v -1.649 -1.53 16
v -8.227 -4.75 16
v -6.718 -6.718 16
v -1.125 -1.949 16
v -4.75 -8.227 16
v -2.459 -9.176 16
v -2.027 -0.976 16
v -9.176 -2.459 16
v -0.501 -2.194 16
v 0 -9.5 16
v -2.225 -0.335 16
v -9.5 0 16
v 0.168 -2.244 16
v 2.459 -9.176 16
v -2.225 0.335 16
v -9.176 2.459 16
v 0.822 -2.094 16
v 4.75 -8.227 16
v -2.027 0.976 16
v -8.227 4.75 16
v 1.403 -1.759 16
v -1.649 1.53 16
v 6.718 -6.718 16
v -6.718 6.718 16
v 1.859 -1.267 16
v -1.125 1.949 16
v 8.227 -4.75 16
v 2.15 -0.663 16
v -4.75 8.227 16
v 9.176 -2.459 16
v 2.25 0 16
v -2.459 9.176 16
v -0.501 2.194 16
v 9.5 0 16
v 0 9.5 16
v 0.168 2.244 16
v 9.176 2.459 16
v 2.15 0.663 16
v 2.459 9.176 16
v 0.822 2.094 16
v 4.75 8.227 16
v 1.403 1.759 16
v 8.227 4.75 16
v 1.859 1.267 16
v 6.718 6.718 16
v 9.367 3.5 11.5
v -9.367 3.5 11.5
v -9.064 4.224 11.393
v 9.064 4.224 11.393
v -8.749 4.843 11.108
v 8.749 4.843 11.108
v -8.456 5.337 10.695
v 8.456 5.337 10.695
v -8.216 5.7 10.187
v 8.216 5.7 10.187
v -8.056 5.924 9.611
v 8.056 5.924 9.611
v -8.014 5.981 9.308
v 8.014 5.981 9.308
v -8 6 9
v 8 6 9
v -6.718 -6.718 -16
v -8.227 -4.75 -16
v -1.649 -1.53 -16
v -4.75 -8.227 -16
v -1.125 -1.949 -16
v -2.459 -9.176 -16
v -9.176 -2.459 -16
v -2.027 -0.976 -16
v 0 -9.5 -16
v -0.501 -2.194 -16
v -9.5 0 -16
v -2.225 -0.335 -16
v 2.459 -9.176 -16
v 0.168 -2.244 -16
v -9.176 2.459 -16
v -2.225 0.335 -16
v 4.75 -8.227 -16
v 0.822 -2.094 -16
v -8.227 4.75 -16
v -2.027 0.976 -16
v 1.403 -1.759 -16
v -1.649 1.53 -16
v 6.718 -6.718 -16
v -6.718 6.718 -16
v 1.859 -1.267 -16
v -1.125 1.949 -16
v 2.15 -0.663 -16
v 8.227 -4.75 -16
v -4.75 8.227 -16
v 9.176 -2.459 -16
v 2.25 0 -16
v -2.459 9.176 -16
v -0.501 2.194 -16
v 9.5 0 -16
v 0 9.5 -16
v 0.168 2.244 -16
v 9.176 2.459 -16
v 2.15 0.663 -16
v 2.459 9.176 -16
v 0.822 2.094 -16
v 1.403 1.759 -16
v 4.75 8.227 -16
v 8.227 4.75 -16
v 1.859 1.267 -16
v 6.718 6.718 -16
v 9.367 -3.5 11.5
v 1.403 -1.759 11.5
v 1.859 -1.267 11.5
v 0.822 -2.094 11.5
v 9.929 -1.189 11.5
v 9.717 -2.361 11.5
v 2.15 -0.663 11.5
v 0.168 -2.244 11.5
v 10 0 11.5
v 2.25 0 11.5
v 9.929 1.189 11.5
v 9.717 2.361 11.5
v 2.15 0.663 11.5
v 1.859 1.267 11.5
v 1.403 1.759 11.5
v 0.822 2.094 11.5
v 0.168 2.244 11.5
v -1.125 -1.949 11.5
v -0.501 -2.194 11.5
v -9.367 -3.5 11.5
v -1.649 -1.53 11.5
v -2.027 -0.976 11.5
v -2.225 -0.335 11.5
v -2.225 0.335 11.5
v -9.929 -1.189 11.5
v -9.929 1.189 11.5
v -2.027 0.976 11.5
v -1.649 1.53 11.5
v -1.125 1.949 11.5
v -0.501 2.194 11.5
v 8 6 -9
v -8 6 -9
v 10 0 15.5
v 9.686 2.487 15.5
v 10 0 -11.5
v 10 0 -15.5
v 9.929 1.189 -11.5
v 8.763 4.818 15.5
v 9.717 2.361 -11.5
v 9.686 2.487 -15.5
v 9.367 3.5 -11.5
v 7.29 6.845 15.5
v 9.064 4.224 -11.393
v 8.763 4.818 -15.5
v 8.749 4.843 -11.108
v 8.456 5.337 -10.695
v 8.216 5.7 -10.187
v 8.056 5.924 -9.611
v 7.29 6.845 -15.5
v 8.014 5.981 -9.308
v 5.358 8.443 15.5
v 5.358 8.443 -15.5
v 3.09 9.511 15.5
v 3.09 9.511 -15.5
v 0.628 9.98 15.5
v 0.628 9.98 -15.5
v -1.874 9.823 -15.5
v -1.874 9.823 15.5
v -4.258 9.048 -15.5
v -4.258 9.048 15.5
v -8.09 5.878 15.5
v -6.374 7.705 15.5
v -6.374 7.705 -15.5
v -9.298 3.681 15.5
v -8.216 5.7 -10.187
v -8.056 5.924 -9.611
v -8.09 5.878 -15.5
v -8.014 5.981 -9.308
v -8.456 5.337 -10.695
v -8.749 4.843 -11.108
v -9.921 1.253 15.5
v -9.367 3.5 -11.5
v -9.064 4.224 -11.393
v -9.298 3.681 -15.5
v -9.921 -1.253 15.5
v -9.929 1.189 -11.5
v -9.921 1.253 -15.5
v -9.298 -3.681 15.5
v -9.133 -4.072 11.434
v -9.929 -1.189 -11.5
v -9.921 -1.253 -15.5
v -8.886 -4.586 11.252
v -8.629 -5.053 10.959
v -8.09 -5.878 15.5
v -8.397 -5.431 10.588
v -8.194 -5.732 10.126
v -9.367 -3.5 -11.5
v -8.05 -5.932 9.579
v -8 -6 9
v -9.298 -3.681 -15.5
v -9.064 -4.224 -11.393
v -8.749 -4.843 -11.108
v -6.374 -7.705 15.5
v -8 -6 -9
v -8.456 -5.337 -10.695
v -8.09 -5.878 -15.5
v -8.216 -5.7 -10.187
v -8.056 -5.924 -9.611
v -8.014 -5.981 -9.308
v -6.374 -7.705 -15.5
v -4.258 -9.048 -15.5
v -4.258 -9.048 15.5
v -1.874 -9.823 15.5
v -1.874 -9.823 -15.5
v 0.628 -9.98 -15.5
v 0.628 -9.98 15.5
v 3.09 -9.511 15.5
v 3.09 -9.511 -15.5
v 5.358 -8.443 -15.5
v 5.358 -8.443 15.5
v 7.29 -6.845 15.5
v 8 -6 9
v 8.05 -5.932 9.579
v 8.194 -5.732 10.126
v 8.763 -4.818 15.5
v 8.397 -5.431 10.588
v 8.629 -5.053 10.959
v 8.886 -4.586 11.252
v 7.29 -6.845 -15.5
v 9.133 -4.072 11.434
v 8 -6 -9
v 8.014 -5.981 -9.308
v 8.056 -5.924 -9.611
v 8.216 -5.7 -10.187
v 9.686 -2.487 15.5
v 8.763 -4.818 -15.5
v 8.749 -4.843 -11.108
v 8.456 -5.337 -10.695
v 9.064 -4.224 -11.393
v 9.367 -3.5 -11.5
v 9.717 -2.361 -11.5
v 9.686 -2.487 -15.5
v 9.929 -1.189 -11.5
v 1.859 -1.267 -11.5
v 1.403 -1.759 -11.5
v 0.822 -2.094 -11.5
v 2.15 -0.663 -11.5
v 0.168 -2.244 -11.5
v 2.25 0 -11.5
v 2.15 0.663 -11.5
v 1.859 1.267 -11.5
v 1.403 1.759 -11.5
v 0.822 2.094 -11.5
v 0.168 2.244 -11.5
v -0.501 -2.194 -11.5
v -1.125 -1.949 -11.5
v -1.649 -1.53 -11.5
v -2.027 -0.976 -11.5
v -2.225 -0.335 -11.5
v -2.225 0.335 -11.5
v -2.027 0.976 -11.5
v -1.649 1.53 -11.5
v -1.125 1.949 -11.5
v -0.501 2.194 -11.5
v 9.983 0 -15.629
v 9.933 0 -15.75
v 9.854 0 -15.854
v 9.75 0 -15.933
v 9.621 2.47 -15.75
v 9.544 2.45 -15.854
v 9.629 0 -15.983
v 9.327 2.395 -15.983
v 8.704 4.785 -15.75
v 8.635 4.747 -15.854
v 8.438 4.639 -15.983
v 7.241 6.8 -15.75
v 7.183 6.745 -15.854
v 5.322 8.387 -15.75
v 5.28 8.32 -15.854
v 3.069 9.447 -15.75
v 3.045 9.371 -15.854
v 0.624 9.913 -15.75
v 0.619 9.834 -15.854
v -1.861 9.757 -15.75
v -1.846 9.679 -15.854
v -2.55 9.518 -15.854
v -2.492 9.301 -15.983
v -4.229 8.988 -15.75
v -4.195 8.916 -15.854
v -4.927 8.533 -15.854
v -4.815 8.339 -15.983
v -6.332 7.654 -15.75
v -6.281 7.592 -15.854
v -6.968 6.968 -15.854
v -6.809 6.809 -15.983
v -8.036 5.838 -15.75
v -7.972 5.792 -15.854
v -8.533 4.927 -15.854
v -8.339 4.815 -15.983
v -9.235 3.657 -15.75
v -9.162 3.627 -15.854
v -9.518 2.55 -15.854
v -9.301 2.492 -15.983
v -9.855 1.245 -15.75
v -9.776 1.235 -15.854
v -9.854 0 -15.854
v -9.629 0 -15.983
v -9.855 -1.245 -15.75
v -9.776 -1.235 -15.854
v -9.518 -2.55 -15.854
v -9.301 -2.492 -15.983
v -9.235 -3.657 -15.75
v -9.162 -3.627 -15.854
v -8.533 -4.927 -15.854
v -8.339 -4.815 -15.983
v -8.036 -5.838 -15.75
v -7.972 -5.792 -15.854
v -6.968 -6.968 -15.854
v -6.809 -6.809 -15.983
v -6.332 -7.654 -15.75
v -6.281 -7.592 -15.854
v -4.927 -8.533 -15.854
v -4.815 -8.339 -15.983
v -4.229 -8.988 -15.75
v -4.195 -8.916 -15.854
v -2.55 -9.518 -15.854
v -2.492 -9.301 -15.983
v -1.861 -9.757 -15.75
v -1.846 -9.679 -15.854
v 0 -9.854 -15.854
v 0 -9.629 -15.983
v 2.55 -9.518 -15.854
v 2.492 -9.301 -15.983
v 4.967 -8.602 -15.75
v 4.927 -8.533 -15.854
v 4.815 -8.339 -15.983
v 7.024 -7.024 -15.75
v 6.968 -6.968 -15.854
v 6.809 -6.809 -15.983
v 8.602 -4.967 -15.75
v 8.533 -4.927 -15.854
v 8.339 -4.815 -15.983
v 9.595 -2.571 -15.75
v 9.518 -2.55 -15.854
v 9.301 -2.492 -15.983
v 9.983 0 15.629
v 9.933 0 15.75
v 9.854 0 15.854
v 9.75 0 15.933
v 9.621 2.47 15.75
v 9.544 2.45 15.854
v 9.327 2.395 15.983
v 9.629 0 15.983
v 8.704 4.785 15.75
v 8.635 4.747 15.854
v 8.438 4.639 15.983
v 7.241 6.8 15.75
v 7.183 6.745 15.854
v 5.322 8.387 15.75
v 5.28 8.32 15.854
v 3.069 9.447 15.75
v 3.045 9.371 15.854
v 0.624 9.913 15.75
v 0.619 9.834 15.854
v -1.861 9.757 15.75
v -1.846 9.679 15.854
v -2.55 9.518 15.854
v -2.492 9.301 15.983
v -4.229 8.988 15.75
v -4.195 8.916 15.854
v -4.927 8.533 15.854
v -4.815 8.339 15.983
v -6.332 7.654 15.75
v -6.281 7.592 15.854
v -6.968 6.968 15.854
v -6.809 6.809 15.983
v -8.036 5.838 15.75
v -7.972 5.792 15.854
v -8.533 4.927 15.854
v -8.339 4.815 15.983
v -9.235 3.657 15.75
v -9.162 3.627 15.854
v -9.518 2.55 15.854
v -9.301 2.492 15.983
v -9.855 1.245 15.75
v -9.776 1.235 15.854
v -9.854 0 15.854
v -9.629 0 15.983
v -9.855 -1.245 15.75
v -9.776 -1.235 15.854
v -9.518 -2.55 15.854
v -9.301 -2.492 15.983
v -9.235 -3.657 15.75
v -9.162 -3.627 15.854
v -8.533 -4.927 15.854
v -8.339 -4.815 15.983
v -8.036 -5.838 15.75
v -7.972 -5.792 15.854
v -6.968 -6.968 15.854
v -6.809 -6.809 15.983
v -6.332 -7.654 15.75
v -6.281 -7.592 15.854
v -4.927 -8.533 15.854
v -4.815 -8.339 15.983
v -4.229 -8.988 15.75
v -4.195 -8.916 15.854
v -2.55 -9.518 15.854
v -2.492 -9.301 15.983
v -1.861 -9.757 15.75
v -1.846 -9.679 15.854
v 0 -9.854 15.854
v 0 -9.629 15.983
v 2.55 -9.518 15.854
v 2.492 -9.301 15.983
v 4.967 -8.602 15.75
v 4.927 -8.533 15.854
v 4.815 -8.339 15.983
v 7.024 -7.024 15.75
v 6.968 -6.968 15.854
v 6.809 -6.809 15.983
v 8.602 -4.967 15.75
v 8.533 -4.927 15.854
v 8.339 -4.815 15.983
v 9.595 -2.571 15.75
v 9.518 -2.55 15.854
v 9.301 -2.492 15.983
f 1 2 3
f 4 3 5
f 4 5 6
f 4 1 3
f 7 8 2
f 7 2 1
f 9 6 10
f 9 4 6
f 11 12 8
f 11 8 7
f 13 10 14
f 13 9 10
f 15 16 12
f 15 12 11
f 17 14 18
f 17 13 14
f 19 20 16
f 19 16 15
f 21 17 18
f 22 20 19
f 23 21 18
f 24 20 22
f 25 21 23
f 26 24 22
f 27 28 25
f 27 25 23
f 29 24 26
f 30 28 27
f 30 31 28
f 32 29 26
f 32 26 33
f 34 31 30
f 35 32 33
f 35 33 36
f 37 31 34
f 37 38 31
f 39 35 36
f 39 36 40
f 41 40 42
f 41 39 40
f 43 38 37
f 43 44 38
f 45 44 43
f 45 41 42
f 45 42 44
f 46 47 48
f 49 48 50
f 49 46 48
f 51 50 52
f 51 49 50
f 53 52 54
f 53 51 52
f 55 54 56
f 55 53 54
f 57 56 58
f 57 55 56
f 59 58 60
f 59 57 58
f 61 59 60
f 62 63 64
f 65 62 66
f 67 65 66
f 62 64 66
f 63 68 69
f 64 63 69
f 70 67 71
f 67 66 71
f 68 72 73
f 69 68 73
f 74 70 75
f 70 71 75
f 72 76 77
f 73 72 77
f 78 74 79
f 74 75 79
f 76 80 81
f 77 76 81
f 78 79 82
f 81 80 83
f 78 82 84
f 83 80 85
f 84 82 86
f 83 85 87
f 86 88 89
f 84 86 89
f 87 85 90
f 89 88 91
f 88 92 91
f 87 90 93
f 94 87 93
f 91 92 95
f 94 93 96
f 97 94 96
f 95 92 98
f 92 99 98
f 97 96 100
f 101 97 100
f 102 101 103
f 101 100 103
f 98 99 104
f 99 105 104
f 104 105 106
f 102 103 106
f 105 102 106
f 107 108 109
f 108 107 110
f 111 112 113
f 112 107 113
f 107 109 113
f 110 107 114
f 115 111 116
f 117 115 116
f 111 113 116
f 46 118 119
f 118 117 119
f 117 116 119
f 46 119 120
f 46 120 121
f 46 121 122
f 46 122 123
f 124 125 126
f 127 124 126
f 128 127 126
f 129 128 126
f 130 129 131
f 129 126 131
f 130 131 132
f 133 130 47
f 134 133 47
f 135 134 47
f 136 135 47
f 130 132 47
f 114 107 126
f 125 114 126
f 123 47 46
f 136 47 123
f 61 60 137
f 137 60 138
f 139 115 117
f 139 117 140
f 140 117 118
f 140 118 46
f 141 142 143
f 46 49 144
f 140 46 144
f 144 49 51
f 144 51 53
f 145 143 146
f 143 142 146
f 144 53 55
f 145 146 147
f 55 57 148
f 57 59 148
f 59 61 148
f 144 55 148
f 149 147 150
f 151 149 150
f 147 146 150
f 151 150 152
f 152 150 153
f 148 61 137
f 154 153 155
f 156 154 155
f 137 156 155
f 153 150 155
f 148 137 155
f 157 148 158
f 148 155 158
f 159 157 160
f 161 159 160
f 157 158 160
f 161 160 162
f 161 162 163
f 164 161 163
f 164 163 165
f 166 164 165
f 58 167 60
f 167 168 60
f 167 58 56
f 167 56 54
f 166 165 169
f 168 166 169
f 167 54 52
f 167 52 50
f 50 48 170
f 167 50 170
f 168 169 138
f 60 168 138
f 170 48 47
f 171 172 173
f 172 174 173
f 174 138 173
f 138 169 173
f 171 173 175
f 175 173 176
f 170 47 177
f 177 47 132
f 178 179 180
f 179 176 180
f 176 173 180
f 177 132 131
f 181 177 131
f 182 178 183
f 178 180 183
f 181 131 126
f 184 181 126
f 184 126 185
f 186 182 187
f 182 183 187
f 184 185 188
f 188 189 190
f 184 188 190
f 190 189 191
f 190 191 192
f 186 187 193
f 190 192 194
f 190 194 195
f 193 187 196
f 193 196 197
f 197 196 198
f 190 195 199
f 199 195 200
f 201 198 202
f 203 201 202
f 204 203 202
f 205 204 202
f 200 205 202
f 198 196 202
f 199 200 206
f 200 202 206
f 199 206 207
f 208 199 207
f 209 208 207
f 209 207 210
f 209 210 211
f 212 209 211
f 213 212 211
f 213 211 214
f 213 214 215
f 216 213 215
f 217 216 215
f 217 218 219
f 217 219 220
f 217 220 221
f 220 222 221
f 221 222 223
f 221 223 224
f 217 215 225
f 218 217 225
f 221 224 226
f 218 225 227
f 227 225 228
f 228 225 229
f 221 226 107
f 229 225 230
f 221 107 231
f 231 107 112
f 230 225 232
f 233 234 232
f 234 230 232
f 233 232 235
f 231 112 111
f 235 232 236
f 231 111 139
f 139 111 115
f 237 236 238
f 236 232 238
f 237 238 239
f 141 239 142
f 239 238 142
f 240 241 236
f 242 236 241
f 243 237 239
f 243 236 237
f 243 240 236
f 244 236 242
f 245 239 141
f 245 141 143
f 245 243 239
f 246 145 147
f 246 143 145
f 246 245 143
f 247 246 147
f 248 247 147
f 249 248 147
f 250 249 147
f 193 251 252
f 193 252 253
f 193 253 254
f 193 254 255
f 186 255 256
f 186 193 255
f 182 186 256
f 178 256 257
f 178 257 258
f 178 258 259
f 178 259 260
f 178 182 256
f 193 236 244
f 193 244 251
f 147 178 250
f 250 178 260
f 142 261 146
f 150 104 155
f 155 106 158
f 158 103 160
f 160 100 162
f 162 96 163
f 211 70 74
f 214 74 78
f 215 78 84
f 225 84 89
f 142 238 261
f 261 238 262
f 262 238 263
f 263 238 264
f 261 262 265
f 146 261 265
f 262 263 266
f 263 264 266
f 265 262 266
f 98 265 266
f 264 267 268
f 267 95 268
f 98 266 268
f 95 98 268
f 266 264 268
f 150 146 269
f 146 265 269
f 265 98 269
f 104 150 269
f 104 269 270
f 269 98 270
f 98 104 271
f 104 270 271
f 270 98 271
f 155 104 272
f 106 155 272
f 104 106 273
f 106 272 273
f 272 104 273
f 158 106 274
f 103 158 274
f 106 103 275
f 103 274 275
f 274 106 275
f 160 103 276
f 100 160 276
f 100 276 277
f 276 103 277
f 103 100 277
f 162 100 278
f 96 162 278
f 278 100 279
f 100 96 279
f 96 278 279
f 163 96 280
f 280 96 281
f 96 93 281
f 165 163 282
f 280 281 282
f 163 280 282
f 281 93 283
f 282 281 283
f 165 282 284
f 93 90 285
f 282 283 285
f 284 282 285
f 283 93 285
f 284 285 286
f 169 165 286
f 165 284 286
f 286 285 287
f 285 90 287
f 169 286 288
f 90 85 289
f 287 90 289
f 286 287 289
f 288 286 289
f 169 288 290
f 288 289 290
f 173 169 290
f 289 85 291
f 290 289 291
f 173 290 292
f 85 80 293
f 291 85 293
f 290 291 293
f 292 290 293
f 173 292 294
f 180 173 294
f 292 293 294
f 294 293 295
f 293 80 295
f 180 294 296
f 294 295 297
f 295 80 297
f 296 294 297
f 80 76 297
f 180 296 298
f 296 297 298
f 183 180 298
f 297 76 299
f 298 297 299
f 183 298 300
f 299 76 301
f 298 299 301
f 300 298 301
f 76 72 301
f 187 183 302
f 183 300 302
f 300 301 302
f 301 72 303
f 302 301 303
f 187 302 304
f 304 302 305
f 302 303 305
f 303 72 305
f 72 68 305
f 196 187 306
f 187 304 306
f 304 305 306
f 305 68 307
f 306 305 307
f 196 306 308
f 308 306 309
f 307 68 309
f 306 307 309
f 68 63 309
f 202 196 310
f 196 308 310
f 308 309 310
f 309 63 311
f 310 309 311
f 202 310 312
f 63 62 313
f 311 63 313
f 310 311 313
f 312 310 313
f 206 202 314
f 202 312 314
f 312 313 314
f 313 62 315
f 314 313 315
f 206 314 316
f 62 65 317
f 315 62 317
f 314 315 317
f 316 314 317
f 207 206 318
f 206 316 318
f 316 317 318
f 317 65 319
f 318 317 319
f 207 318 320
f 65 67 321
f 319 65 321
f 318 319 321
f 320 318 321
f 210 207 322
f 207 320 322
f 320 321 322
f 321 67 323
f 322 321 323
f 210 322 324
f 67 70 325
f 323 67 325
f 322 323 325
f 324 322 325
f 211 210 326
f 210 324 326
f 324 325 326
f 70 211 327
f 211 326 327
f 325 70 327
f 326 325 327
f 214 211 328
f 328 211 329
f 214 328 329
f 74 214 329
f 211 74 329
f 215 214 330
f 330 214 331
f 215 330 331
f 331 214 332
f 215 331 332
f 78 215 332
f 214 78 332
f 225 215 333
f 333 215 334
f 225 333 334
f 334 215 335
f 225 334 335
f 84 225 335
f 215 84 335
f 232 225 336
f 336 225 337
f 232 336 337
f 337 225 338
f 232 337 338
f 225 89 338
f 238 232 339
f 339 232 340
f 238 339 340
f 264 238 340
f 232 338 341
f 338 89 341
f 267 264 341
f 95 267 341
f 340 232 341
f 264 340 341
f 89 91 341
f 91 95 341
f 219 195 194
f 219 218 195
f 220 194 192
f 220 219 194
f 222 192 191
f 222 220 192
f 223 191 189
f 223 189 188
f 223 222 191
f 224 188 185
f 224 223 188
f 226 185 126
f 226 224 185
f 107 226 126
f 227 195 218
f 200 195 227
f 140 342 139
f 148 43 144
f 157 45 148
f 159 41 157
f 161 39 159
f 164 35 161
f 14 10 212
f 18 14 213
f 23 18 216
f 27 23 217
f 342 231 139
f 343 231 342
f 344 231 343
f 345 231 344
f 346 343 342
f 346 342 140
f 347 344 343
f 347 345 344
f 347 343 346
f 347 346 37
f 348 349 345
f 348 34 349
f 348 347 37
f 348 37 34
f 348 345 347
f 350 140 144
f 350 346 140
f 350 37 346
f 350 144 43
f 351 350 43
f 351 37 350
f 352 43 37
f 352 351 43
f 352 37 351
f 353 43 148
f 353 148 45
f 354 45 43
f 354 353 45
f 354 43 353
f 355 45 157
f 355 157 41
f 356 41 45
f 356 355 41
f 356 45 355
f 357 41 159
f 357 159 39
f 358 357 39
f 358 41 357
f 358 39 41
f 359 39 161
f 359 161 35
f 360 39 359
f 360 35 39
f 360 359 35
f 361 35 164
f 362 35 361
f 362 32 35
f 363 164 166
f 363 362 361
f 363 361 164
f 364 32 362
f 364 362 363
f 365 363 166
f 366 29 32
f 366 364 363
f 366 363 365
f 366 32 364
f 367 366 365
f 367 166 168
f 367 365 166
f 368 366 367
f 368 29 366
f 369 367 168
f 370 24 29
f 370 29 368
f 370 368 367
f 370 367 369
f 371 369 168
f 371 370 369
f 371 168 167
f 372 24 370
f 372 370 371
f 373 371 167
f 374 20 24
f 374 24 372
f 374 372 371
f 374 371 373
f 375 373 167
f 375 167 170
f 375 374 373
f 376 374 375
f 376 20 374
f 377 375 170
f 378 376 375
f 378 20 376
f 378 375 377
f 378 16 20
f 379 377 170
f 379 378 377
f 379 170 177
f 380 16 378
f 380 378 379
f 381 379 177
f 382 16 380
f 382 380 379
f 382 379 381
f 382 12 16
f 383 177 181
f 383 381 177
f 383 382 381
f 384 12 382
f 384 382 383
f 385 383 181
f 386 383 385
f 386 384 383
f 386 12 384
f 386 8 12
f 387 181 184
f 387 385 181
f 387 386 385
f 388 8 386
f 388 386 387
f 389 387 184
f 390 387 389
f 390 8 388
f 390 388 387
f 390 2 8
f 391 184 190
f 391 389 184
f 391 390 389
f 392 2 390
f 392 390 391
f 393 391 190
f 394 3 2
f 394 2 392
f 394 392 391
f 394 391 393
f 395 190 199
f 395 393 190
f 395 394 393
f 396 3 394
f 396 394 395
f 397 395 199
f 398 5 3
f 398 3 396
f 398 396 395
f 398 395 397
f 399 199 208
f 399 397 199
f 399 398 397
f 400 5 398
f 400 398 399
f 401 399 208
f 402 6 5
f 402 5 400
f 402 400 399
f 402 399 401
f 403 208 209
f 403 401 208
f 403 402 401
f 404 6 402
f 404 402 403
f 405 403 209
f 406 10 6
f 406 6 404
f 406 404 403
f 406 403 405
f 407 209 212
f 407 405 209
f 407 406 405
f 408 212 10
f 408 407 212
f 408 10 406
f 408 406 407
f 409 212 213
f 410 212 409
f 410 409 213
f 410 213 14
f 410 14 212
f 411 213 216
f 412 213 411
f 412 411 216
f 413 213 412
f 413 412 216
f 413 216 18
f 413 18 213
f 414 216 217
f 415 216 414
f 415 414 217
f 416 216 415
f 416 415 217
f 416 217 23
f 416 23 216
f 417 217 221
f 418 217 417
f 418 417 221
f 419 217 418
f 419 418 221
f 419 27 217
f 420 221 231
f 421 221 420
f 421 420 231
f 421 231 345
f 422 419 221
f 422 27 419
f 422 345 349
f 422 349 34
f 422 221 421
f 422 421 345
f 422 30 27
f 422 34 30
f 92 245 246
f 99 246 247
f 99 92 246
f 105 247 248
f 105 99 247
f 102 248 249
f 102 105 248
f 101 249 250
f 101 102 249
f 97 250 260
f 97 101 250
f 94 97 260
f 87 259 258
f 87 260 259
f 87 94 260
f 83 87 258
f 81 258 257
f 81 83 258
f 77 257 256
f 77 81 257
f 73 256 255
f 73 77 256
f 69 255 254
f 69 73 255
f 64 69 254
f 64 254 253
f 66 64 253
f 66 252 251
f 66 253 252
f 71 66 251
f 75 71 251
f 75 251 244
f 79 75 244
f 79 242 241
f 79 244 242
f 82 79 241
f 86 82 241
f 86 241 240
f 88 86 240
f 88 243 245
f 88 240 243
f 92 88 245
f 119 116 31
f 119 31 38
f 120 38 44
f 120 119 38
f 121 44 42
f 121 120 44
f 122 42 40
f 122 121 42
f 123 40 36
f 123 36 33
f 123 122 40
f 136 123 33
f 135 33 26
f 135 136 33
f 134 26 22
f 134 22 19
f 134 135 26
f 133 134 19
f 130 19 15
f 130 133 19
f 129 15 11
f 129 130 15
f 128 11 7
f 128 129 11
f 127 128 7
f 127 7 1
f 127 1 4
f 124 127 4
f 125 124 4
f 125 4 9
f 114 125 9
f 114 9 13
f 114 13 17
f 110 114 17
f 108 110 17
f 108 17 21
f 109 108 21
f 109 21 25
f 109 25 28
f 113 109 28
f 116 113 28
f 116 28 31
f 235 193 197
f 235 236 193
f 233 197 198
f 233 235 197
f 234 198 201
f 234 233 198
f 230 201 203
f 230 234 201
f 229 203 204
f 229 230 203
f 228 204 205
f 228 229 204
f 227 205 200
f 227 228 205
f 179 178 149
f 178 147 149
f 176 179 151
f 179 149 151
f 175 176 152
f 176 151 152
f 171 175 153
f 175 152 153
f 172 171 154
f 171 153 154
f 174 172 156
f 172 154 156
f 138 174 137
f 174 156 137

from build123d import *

# Parameters (mm, degrees)
BOSS_EXTRUDE1_DEPTH      = 16
BOSS_EXTRUDE1_DEPTH_BACK = 16
SKETCH1_R                = 10
SKETCH1_R_2              = 2.25
CUT_EXTRUDE1_DEPTH       = 22.354156504
CUT_EXTRUDE1_DEPTH_BACK  = 22.354156504
SKETCH2_W                = 23
SKETCH2_H                = 12
FILLET1_R                = 0.5
FILLET2_R                = 2.5


with BuildPart() as part:
    # Sketch1 → Boss-Extrude1 (new, two sides: drawn at the far end of the back side and taken through both)
    with BuildSketch(Plane.XY.offset(-BOSS_EXTRUDE1_DEPTH_BACK)):
        Circle(SKETCH1_R)
        Circle(SKETCH1_R_2, mode=Mode.SUBTRACT)
    extrude(amount=BOSS_EXTRUDE1_DEPTH + BOSS_EXTRUDE1_DEPTH_BACK)

    # Sketch2 → Cut-Extrude1 (cut, two sides: drawn at the far end of the back side and taken through both)
    with BuildSketch(Plane(origin=(0, 0, 0), x_dir=(0, 0, -1), z_dir=(1, 0, 0)).offset(-CUT_EXTRUDE1_DEPTH_BACK)):
        Rectangle(SKETCH2_W, SKETCH2_H)
    extrude(amount=CUT_EXTRUDE1_DEPTH + CUT_EXTRUDE1_DEPTH_BACK, mode=Mode.SUBTRACT)

    # Fillet1
    fillet1_edges = [part.edges().sort_by_distance(p)[0] for p in [
        (-10, 0, -16),
        (-10, 0, 16),
    ]]
    fillet(fillet1_edges, radius=FILLET1_R)

    # Fillet2
    fillet2_edges = [part.edges().sort_by_distance(p)[0] for p in [
        (0, -6, 11.5),
        (0, 6, -11.5),
        (0, 6, 11.5),
        (0, -6, -11.5),
    ]]
    fillet(fillet2_edges, radius=FILLET2_R)


solid = part.part
